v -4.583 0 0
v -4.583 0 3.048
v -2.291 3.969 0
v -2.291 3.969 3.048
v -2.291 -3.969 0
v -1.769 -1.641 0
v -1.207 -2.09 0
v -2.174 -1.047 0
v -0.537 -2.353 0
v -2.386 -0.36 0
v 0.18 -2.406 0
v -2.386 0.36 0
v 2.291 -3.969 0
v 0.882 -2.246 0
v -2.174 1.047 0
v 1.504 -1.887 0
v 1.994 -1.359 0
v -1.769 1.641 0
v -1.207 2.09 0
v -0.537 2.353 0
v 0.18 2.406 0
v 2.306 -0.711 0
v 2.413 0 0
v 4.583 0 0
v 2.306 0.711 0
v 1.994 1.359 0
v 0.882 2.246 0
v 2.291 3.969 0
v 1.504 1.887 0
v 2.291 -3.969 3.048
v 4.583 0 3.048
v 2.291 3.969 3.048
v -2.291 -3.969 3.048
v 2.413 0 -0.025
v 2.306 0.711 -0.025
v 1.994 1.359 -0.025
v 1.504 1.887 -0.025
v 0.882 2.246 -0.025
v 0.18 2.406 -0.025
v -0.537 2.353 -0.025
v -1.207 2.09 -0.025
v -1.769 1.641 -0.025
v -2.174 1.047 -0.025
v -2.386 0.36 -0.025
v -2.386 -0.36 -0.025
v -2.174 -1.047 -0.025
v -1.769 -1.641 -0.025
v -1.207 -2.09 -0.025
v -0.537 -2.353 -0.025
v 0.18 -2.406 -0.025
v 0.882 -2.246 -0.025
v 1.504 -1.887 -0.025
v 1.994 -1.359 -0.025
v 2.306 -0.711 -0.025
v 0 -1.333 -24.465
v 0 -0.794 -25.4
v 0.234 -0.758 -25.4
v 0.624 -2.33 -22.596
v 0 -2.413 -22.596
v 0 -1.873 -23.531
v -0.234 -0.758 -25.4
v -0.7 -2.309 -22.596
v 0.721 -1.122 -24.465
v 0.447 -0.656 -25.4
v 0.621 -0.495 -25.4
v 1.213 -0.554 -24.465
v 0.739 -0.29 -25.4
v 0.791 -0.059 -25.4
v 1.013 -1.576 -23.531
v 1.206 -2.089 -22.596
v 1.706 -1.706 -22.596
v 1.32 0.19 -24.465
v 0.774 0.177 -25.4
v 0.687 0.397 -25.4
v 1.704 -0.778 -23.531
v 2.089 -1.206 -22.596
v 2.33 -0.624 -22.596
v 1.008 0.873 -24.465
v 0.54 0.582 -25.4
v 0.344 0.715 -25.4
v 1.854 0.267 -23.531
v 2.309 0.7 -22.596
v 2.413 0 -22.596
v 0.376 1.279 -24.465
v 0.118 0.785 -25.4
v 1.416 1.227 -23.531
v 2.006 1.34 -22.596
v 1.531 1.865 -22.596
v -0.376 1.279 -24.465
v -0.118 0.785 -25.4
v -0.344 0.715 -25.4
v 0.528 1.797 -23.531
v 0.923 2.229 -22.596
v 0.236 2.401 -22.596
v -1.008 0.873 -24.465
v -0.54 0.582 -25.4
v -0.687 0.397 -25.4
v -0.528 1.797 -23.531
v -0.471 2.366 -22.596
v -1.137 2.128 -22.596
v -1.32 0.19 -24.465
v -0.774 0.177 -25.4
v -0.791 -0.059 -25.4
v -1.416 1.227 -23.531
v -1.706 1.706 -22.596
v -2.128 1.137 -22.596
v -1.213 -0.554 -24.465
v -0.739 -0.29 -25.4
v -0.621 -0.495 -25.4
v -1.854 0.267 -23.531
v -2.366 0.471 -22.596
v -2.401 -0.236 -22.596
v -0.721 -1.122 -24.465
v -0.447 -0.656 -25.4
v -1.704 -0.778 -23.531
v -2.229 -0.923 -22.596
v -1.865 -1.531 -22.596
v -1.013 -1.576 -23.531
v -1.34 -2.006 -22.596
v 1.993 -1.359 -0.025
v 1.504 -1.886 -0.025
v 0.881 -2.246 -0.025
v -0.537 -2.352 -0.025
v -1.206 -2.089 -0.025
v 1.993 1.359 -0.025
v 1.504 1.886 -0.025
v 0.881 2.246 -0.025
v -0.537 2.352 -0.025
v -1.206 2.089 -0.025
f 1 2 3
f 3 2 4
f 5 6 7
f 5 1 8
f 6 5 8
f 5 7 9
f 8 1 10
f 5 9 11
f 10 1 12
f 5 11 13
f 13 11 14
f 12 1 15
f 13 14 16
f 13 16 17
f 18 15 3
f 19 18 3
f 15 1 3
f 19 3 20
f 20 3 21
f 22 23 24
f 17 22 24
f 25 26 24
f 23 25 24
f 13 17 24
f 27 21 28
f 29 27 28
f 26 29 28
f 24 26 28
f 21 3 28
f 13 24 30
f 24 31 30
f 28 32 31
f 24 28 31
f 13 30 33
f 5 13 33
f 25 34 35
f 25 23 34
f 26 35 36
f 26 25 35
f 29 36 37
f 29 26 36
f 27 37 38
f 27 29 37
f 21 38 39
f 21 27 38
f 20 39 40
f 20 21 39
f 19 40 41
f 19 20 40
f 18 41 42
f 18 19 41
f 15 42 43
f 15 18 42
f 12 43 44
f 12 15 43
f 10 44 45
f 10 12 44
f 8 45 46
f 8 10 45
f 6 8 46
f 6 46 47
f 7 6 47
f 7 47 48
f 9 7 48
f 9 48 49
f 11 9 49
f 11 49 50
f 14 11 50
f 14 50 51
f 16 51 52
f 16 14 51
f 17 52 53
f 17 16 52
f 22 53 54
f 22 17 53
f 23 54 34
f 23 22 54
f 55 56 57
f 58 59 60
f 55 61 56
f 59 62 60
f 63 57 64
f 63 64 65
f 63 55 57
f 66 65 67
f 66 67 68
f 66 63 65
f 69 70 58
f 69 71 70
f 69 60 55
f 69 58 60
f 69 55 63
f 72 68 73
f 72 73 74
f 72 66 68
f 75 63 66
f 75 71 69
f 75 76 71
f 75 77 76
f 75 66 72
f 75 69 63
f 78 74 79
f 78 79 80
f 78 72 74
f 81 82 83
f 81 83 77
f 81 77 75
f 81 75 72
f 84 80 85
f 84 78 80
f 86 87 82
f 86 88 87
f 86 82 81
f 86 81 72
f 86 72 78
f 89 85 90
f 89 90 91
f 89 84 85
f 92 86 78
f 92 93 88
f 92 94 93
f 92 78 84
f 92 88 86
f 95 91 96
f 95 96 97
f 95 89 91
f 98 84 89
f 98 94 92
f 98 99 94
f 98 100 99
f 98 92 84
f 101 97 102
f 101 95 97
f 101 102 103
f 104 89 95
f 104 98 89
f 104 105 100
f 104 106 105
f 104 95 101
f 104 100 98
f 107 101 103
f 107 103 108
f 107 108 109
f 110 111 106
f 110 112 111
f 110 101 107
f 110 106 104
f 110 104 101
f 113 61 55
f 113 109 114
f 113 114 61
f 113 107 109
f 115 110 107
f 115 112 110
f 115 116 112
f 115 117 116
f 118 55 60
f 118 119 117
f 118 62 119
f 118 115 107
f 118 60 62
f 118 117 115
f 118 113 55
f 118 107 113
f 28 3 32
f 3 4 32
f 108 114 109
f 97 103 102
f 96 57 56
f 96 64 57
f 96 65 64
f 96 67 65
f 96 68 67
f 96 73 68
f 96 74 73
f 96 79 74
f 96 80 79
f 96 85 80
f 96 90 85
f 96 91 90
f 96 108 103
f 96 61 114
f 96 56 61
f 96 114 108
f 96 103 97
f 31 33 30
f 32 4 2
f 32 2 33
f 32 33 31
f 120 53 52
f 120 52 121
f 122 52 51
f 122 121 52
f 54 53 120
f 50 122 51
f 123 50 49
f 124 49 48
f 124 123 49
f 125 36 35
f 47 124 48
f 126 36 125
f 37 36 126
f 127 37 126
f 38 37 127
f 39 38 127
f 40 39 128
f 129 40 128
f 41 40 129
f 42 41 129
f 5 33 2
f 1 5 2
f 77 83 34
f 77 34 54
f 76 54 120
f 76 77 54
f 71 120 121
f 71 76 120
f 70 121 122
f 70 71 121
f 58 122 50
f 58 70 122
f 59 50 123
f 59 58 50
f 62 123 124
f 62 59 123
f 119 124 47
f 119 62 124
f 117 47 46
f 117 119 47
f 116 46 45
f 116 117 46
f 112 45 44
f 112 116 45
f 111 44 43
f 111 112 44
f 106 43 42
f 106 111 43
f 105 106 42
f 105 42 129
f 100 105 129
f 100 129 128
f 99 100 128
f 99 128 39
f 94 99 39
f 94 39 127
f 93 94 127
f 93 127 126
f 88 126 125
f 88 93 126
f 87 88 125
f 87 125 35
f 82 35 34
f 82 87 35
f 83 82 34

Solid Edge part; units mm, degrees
sketch "Sketch1" plane through (0, 0, 0) normal (0, 0, 1) x (1, 0, 0)
  circle A0 centre (0, 0) radius 6.4452
  dimension "D1" = 12.8905
extrude "Protrusion1" add sketch "Sketch1" along normal blind 3.048
sketch "Sketch2" plane through (0, 0, 0) normal (0, 0, -1) x (1, 0, 0)
  circle A0 centre (0, 0) radius 2.413
extrude "Protrusion2" add sketch "Sketch2" along normal blind 25.4
sketch "Sketch3" plane through (0, 0, -25.4) normal (0, 0, -1) x (1, 0, 0)
  circle A0 centre (0, 0) radius 2.4127
extrude "Cutout1" cut sketch "Sketch3" against normal blind 25.3746 flip side to cut
sketch "Sketch4" plane through (0, 0, 3.048) normal (0, 0, 1) x (1, 0, 0)
  line L0 (-5.0784, 3.9688) -> (5.0784, 3.9688)
  dimension "D1" = 7.9375
extrude "Cutout2" cut sketch "Sketch4" against normal up to next material side at (0, 4.0188, 3.048)
sketch "Sketch5" plane through (0, 0, 0) normal (1, 0, 0) x (0, 1, 0)
  line L0 (-0.7937, -25.4) -> (-2.4127, -22.5958)
  dimension "D1" = 0.7937
revolve "RevolvedCutout1" cut sketch "Sketch5" angle 360 about axis through (0, 0, -14.7796) along (0, 0, 1) material side at (0, -1.6465, -24.0229)
pattern_circular "Pattern1" count 6 over 360 about axis through (0, 0, 3.048) along (0, 0, 1) of "Cutout2"
properties part number "24100703"
